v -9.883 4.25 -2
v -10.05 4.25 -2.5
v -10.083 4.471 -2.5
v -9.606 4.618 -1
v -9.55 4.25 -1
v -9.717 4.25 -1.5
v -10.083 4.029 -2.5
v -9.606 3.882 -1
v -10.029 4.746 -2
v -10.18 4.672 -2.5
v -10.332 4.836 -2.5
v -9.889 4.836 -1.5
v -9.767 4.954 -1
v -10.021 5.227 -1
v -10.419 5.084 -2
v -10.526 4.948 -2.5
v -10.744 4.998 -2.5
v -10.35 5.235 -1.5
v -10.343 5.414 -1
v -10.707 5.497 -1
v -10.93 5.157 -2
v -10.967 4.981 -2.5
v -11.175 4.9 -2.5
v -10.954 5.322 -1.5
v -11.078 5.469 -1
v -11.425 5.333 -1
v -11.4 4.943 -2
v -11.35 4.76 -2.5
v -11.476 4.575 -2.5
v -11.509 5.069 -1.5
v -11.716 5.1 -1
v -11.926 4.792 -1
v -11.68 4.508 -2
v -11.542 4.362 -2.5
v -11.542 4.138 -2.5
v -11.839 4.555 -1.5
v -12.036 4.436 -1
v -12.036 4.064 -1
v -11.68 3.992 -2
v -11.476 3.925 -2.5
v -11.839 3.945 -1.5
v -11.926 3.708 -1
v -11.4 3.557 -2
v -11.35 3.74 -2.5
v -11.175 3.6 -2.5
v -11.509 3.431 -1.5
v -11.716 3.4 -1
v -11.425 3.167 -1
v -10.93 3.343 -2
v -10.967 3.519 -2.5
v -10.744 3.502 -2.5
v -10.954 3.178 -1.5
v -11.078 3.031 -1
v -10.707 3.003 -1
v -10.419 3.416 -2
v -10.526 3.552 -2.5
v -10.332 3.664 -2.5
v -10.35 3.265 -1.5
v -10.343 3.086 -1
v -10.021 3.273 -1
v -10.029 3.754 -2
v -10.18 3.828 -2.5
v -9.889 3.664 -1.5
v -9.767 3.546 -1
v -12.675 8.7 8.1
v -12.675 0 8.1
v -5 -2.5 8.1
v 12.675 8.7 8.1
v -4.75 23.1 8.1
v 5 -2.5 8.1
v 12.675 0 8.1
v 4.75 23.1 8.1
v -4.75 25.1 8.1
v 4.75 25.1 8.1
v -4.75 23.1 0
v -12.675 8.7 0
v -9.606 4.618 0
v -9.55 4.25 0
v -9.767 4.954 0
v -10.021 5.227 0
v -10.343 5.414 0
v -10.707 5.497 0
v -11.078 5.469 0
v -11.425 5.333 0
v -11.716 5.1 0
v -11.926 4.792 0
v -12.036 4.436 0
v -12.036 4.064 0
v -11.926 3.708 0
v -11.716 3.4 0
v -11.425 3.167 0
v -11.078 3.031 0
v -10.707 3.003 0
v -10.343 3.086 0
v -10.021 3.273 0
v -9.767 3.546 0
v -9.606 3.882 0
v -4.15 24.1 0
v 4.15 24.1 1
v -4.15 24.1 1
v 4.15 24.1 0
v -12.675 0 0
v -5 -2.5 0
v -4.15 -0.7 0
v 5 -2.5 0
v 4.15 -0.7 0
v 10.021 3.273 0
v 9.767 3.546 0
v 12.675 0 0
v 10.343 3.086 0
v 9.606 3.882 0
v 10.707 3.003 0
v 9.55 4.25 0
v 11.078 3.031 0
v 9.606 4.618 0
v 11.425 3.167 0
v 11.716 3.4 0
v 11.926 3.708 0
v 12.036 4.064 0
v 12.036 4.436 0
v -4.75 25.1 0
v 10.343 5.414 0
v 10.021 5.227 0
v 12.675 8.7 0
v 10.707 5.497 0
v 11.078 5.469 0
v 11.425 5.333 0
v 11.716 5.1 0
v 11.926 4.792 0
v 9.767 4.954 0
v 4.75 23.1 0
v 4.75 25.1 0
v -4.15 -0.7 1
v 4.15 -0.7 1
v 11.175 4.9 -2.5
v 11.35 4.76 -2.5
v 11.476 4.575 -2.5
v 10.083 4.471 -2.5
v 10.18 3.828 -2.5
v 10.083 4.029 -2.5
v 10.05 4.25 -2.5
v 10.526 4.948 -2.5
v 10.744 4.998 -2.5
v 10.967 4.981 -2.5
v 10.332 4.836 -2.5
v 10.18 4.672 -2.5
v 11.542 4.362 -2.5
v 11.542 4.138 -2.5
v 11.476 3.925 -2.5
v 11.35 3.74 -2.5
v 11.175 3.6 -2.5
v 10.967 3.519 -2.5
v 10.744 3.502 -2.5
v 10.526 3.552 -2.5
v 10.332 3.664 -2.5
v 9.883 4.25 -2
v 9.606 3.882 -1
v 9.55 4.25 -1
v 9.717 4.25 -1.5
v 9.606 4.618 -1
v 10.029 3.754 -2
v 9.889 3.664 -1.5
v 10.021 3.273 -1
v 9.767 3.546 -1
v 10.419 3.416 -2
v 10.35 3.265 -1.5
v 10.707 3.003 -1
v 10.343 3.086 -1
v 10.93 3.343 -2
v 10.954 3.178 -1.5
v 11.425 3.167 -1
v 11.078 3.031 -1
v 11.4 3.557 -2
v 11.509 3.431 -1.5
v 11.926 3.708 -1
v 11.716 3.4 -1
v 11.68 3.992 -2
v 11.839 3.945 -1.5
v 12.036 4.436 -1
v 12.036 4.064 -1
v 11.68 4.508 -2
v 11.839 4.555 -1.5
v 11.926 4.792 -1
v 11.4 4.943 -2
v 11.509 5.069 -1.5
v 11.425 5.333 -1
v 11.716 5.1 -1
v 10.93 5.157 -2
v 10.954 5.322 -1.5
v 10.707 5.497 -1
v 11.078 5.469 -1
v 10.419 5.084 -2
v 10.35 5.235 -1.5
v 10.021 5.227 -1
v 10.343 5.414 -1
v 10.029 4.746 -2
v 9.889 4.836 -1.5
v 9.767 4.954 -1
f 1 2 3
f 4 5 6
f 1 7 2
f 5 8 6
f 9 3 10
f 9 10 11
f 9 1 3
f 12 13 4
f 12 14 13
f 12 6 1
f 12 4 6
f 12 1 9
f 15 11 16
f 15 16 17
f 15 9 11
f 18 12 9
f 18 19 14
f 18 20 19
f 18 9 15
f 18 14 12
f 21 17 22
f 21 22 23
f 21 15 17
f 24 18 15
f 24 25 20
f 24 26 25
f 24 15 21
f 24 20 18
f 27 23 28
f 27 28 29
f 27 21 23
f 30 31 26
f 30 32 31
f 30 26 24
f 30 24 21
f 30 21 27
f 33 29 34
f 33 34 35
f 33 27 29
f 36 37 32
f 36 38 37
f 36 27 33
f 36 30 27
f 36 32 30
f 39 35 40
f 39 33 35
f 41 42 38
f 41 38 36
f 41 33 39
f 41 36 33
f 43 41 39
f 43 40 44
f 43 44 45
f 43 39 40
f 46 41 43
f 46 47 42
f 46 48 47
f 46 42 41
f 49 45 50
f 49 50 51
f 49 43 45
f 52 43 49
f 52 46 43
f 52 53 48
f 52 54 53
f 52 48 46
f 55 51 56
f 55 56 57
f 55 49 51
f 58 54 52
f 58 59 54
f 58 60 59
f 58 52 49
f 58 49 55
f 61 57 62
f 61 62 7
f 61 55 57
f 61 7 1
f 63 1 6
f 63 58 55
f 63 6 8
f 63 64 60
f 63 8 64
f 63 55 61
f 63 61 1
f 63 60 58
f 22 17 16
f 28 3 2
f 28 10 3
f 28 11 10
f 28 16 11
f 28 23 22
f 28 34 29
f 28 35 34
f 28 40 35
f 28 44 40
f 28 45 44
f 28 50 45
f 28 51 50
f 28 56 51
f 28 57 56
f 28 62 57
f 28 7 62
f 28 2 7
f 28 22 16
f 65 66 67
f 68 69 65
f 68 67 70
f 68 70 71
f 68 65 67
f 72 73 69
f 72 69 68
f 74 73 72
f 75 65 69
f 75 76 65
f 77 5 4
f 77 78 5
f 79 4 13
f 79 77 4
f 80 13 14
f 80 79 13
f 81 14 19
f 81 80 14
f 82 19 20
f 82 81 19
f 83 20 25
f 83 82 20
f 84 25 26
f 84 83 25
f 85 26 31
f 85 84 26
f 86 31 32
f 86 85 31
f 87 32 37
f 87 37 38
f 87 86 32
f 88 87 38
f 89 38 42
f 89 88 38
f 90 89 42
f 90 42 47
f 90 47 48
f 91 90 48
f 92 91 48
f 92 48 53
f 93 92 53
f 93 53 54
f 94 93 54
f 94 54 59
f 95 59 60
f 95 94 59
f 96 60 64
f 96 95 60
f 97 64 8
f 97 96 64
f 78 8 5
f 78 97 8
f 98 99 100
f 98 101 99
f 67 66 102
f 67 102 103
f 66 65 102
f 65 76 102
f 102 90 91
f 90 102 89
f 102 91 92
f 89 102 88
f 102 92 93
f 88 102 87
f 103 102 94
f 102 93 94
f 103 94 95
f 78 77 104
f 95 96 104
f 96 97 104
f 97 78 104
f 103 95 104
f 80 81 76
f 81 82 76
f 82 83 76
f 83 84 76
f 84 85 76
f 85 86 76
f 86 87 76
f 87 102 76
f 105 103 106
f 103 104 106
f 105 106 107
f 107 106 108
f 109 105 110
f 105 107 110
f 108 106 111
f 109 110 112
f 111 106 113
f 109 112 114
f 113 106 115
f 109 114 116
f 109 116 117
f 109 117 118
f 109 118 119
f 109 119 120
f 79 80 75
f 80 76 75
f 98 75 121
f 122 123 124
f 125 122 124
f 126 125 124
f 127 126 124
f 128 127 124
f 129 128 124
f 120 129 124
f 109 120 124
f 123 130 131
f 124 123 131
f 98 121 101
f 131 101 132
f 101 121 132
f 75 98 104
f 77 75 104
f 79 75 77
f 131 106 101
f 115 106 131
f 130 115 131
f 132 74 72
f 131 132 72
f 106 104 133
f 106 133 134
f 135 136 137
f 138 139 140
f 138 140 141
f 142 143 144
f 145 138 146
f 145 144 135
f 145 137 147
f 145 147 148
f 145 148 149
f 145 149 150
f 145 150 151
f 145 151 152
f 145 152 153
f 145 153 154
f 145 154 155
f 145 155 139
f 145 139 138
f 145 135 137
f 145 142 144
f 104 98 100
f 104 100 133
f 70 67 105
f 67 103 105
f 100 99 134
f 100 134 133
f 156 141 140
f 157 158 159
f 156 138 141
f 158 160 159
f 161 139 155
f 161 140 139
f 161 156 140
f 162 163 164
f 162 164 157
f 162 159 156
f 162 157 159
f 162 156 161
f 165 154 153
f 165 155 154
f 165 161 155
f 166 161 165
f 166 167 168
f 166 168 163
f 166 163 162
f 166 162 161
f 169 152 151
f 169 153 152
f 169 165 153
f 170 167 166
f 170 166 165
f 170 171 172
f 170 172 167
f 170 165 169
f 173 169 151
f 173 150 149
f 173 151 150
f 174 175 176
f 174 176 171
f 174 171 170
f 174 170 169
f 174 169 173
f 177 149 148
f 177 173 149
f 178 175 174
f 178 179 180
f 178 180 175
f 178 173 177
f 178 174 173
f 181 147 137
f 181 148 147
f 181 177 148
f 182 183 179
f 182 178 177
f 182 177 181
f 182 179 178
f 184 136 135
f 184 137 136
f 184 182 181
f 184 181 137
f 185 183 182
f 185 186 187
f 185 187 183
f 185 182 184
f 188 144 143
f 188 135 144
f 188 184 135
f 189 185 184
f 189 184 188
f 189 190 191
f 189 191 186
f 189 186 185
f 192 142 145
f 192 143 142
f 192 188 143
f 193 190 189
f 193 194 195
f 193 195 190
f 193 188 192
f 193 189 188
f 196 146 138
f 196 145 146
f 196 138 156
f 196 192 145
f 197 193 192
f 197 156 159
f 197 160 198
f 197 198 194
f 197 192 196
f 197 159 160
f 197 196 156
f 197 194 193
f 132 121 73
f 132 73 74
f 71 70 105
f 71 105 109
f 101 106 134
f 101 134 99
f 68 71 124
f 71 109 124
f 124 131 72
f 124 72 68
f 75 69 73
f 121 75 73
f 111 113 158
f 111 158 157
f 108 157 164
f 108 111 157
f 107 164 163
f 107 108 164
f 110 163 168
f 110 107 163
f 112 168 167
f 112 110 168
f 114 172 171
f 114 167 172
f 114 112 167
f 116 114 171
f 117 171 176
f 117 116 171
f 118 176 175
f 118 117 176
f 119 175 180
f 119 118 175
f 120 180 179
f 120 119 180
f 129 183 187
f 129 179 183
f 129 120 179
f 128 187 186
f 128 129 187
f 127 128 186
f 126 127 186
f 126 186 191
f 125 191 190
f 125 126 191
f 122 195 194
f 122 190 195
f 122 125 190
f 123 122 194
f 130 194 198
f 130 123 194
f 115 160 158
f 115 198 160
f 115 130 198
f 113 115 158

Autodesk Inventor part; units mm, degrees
ref_plane "YZ Plane" through (0, 0, 0) normal (1, 0, 0) x (0, 1, 0)
ref_plane "XZ Plane" through (0, 0, 0) normal (0, 1, 0) x (-1, 0, 0)
sketch "Sketch1" plane through (0, 0, 0) normal (0, 0, 1) x (1, 0, 0)
  line L0 (-5, -2.5) -> (5, -2.5)
  line L1 (5, -2.5) -> (12.675, 0)
  line L2 (-5, -2.5) -> (-12.675, 0)
  line L3 (12.675, 0) -> (-12.675, 0) construction
  line L4 (12.675, 0) -> (12.675, 8.7)
  line L5 (-12.675, 0) -> (-12.675, 8.7)
  line L6 (-12.675, 8.7) -> (-4.75, 23.1)
  line L7 (-4.75, 23.1) -> (-4.75, 25.1)
  line L8 (-4.75, 25.1) -> (4.75, 25.1)
  line L9 (4.75, 25.1) -> (4.75, 23.1)
  line L10 (4.75, 23.1) -> (12.675, 8.7)
  line L11 (0, -8.02) -> (0, 30.62) projected
  line L12 (0, 25.1) -> (0, -2.5)
  point P0 (0, 0)
  point P1 (0, 0)
  dimension "d0" = 10
  dimension "d1" = 25.35
  dimension "d2" = 2.5
  dimension "d3" = 8.7
  dimension "d4" = 27.6
  dimension "d6" = 2
  dimension "d7" = 9.5
extrude "Body" add sketch "Sketch1" along normal blind 8.1 contours L11 L8 L9 L10 L4 L1 L0
sketch "Sketch5" plane through (0, 0, 0) normal (0, 0, -1) x (-1, 0, 0)
  circle A0 centre (-10.8, 4.25) radius 1.25
  line L0 (-10.8, 4.25) -> (0, 4.25) construction
  line L1 (0, 25.1) -> (0, -2.5) projected
  line L2 (0, -2.5) -> (-5, -2.5) projected
  point P0 (0, 0)
  dimension "d26" = 2.5
  dimension "d27" = 10.8
  dimension "d28" = 6.75
extrude "PinCylinder" add sketch "Sketch5" along normal blind 1
ref_plane "Work Plane3" through (10.8, 4.25, -2.5) normal (0, 0, -1) x (-1, 0, 0)
sketch "Sketch6" plane through (10.8, 4.25, -2.5) normal (0, 0, -1) x (-1, 0, 0)
  circle A0 centre (0, 0) radius 1.25 projected
  circle A1 centre (0, 0) radius 0.75
  point P0 (10.8, -4.25)
  dimension "d32" = 1.5
loft "Loft2" add profiles "Sketch6" section 1 edges at (12.05, 4.25, -1) contours A1
sketch "Sketch7" plane through (0, 0, 0) normal (0, 0, -1) x (-1, 0, 0)
  line L0 (0, -0.7) -> (-4.15, -0.7)
  line L1 (-4.15, -0.7) -> (-4.15, 24.1)
  line L2 (0, -2.5) -> (-5, -2.5) projected
  line L3 (0, 25.1) -> (0, -2.5) projected
  line L4 (-4.15, 24.1) -> (0, 24.1)
  point P0 (0, 0)
  dimension "d37" = 4.15
  dimension "d38" = 24.8
  dimension "d39" = 1.8
extrude "MiddleCutout" cut sketch "Sketch7" against normal blind 1
mirror "Mirror1" about plane through (0, 25.1, 0) normal (-1, 0, 0)
properties part number "Inkjet"
